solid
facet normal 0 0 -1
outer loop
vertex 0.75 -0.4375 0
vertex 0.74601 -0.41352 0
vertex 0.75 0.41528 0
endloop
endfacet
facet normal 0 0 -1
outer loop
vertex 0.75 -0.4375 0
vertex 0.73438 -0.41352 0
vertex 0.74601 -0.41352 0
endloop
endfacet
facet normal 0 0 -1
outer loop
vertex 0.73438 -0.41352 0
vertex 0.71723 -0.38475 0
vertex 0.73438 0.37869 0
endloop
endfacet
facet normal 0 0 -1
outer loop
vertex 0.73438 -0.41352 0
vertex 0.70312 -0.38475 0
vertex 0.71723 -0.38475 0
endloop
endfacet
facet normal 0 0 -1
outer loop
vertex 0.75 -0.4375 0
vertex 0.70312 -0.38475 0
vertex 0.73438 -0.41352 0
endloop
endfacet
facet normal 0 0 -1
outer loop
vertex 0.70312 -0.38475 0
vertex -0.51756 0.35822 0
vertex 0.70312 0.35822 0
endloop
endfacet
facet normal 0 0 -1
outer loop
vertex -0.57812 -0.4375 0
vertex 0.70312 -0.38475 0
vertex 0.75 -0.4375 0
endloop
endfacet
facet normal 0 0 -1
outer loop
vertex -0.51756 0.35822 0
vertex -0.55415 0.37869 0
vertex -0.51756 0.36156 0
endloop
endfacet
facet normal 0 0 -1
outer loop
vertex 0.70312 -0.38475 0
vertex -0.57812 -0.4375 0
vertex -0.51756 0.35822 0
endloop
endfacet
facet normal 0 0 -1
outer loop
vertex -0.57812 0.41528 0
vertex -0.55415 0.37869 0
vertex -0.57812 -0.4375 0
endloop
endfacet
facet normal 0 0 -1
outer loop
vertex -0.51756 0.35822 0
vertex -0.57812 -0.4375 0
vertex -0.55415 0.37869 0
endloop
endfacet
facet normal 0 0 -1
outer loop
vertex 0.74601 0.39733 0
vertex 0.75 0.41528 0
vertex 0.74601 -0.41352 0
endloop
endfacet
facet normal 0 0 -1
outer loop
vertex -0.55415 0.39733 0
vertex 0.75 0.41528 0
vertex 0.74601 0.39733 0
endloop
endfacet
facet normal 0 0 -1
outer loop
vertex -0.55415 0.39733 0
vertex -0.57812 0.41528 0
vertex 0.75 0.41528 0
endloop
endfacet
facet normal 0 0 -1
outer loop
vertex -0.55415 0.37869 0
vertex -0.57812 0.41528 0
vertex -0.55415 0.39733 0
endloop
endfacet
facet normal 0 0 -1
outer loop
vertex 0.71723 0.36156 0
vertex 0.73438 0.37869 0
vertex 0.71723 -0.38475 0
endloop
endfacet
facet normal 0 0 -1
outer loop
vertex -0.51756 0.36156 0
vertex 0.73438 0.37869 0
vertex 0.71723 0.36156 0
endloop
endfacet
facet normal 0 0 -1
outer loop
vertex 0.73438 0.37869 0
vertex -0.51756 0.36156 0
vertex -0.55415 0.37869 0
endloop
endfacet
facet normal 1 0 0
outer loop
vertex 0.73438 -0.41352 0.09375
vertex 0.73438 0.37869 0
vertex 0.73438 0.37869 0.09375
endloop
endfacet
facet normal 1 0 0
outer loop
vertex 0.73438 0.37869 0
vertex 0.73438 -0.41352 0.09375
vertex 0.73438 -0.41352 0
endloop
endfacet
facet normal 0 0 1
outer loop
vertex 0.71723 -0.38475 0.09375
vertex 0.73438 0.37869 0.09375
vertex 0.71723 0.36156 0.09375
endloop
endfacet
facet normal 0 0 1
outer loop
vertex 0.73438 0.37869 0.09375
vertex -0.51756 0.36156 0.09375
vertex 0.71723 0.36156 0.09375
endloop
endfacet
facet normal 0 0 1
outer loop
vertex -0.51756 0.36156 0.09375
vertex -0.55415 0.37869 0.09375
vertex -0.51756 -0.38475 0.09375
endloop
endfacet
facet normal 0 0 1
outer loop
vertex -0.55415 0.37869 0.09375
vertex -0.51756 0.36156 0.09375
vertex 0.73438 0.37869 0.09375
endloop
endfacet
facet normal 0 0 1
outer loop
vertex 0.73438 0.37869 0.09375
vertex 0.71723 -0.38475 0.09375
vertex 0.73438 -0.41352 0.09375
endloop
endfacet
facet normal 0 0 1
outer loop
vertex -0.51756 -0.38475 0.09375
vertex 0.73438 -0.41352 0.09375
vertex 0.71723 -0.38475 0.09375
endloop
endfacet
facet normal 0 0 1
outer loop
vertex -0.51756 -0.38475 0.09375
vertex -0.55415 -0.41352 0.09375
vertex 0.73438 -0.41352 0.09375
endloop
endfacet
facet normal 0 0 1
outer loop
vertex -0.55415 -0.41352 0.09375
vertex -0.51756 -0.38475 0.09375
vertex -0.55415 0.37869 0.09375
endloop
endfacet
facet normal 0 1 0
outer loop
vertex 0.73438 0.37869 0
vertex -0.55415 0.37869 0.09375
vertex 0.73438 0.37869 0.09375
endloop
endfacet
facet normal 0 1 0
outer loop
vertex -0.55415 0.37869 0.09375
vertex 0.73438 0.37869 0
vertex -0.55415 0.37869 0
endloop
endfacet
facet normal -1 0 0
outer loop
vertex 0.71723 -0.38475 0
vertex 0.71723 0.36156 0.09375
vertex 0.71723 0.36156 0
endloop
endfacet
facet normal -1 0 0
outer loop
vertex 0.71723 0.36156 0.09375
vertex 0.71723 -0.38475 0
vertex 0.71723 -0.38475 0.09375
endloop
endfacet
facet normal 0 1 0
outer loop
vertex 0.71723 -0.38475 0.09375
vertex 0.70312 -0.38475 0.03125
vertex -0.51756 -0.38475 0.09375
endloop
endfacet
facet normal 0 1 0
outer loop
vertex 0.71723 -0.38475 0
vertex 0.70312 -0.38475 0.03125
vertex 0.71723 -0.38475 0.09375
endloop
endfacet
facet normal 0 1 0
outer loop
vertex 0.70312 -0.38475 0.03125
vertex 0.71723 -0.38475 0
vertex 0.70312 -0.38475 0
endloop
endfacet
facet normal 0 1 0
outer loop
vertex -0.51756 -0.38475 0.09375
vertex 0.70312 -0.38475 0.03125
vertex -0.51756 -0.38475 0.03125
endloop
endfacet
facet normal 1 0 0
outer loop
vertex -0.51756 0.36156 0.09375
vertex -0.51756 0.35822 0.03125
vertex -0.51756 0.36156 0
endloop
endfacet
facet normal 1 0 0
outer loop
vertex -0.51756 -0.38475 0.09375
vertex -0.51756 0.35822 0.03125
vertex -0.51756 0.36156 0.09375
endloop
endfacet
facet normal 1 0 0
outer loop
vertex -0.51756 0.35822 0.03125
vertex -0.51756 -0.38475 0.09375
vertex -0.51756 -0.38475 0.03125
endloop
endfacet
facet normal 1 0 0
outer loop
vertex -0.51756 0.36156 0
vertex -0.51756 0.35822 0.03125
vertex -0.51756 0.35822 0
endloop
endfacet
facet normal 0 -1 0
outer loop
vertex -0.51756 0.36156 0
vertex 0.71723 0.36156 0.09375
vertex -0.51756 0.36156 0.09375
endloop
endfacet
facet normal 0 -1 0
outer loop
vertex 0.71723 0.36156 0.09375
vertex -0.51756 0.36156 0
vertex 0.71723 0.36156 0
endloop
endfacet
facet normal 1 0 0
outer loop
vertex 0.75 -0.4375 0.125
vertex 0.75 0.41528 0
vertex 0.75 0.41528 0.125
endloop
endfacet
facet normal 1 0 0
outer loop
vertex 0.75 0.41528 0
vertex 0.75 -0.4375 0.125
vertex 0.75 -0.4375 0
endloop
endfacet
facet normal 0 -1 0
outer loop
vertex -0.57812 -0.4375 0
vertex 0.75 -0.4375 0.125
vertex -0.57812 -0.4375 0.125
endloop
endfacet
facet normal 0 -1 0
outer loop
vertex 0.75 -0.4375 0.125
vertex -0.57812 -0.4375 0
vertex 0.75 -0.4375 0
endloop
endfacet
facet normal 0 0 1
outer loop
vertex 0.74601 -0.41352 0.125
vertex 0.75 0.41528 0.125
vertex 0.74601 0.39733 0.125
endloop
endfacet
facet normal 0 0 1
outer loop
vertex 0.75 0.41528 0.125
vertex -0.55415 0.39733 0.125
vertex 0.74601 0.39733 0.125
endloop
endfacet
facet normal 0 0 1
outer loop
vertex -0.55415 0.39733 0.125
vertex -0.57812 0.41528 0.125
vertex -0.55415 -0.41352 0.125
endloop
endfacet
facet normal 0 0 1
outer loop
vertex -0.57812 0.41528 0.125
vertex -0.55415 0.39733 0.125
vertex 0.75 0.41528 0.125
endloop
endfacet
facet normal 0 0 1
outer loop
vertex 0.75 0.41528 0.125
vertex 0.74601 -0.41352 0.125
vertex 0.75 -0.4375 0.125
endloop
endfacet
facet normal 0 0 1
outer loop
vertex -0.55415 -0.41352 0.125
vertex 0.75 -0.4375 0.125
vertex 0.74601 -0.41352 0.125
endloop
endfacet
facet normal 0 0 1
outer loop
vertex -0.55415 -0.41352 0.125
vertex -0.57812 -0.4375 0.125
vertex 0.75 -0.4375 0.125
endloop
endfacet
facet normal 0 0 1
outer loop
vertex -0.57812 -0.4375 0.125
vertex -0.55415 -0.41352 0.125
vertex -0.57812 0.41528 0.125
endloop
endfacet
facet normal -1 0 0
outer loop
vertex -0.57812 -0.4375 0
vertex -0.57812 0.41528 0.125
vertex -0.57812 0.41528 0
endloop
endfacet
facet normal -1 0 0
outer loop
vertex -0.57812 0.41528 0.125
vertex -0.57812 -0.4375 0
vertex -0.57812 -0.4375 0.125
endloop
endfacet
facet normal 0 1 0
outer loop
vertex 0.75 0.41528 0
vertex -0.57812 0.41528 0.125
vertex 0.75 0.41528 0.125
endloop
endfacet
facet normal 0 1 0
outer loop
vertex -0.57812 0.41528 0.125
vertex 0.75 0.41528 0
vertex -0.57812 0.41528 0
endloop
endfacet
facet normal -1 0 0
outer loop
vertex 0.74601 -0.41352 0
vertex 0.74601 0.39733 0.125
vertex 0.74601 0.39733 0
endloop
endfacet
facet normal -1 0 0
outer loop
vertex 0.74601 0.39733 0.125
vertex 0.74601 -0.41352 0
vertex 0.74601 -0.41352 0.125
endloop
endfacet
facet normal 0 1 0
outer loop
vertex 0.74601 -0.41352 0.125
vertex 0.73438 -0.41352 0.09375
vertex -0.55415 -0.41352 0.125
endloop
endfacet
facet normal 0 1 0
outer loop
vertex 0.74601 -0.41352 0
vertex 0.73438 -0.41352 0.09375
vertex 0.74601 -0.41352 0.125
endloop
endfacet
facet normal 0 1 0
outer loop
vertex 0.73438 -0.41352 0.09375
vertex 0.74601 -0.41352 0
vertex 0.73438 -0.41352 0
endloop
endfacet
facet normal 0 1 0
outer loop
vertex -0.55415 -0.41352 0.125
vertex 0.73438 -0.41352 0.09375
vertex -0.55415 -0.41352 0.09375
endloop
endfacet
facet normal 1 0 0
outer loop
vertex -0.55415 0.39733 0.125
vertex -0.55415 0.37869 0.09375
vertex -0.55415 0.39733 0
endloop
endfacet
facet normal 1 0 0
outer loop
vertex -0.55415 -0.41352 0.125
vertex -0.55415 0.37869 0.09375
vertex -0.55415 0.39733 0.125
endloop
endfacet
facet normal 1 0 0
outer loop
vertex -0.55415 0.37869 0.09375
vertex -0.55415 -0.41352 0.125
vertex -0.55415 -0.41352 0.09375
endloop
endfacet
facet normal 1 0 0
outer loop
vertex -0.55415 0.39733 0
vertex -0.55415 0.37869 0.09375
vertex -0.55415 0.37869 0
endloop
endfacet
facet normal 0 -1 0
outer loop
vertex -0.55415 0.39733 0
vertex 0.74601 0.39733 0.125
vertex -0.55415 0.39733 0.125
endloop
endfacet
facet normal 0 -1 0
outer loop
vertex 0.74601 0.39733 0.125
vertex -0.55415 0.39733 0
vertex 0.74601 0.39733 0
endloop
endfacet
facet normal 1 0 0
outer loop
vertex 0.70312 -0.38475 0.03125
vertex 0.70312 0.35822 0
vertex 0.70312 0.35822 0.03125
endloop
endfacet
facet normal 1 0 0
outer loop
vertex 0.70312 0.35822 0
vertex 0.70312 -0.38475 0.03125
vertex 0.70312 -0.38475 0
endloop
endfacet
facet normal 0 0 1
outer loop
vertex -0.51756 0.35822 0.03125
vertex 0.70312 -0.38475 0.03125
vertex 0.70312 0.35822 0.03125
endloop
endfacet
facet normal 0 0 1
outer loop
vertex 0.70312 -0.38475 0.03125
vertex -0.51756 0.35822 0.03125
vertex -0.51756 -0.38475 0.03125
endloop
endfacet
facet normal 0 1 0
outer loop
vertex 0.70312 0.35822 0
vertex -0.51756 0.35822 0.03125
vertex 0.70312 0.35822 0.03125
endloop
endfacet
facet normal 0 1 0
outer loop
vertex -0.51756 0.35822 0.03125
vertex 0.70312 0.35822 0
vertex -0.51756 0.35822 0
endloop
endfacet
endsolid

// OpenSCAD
EPS = 0.01;

module sketch0() {
    translate([-0.5546875, -0.421875, 0]) {
        difference() {
            linear_extrude(height=0.09375) {
                polygon(points=[[1.2890625, 0], [1.2890625, 0.8005756578947368], [0, 0.8005756578947368], [0, 0]]);
            }
            translate([EPS, EPS, 0]) {
                linear_extrude(height=0.09375 + EPS) {
                    polygon(points=[[1.2619243421052633, 0.027138157894736843], [1.2619243421052633, 0.7734375], [0.027138157894736843, 0.7734375], [0.027138157894736843, 0.027138157894736843]]);
                }
            }
        }
    }
}

module sketch1() {
    translate([-0.578125, -0.4375, 0]) {
        difference() {
            linear_extrude(height=0.125) {
                polygon(points=[[1.328125, 0], [1.328125, 0.852796052631579], [0, 0.852796052631579], [0, 0]]);
            }
            translate([EPS, EPS, 0]) {
                linear_extrude(height=0.125 + EPS) {
                    polygon(points=[[1.3141447368421053, 0.013980263157894737], [1.3141447368421053, 0.8248355263157895], [0.013980263157894737, 0.8248355263157895], [0.013980263157894737, 0.013980263157894737]]);
                }
            }
        }
    }
}

module sketch2() {
    translate([-0.5234375, -0.390625, 0]) {
        linear_extrude(height=0.03125) {
            polygon(points=[[1.2265625, 0], [1.2265625, 0.7488486842105263], [0, 0.7488486842105263], [0, 0]]);
        }
    }
}

union() {
    sketch0();
    sketch1();
    sketch2();
}
